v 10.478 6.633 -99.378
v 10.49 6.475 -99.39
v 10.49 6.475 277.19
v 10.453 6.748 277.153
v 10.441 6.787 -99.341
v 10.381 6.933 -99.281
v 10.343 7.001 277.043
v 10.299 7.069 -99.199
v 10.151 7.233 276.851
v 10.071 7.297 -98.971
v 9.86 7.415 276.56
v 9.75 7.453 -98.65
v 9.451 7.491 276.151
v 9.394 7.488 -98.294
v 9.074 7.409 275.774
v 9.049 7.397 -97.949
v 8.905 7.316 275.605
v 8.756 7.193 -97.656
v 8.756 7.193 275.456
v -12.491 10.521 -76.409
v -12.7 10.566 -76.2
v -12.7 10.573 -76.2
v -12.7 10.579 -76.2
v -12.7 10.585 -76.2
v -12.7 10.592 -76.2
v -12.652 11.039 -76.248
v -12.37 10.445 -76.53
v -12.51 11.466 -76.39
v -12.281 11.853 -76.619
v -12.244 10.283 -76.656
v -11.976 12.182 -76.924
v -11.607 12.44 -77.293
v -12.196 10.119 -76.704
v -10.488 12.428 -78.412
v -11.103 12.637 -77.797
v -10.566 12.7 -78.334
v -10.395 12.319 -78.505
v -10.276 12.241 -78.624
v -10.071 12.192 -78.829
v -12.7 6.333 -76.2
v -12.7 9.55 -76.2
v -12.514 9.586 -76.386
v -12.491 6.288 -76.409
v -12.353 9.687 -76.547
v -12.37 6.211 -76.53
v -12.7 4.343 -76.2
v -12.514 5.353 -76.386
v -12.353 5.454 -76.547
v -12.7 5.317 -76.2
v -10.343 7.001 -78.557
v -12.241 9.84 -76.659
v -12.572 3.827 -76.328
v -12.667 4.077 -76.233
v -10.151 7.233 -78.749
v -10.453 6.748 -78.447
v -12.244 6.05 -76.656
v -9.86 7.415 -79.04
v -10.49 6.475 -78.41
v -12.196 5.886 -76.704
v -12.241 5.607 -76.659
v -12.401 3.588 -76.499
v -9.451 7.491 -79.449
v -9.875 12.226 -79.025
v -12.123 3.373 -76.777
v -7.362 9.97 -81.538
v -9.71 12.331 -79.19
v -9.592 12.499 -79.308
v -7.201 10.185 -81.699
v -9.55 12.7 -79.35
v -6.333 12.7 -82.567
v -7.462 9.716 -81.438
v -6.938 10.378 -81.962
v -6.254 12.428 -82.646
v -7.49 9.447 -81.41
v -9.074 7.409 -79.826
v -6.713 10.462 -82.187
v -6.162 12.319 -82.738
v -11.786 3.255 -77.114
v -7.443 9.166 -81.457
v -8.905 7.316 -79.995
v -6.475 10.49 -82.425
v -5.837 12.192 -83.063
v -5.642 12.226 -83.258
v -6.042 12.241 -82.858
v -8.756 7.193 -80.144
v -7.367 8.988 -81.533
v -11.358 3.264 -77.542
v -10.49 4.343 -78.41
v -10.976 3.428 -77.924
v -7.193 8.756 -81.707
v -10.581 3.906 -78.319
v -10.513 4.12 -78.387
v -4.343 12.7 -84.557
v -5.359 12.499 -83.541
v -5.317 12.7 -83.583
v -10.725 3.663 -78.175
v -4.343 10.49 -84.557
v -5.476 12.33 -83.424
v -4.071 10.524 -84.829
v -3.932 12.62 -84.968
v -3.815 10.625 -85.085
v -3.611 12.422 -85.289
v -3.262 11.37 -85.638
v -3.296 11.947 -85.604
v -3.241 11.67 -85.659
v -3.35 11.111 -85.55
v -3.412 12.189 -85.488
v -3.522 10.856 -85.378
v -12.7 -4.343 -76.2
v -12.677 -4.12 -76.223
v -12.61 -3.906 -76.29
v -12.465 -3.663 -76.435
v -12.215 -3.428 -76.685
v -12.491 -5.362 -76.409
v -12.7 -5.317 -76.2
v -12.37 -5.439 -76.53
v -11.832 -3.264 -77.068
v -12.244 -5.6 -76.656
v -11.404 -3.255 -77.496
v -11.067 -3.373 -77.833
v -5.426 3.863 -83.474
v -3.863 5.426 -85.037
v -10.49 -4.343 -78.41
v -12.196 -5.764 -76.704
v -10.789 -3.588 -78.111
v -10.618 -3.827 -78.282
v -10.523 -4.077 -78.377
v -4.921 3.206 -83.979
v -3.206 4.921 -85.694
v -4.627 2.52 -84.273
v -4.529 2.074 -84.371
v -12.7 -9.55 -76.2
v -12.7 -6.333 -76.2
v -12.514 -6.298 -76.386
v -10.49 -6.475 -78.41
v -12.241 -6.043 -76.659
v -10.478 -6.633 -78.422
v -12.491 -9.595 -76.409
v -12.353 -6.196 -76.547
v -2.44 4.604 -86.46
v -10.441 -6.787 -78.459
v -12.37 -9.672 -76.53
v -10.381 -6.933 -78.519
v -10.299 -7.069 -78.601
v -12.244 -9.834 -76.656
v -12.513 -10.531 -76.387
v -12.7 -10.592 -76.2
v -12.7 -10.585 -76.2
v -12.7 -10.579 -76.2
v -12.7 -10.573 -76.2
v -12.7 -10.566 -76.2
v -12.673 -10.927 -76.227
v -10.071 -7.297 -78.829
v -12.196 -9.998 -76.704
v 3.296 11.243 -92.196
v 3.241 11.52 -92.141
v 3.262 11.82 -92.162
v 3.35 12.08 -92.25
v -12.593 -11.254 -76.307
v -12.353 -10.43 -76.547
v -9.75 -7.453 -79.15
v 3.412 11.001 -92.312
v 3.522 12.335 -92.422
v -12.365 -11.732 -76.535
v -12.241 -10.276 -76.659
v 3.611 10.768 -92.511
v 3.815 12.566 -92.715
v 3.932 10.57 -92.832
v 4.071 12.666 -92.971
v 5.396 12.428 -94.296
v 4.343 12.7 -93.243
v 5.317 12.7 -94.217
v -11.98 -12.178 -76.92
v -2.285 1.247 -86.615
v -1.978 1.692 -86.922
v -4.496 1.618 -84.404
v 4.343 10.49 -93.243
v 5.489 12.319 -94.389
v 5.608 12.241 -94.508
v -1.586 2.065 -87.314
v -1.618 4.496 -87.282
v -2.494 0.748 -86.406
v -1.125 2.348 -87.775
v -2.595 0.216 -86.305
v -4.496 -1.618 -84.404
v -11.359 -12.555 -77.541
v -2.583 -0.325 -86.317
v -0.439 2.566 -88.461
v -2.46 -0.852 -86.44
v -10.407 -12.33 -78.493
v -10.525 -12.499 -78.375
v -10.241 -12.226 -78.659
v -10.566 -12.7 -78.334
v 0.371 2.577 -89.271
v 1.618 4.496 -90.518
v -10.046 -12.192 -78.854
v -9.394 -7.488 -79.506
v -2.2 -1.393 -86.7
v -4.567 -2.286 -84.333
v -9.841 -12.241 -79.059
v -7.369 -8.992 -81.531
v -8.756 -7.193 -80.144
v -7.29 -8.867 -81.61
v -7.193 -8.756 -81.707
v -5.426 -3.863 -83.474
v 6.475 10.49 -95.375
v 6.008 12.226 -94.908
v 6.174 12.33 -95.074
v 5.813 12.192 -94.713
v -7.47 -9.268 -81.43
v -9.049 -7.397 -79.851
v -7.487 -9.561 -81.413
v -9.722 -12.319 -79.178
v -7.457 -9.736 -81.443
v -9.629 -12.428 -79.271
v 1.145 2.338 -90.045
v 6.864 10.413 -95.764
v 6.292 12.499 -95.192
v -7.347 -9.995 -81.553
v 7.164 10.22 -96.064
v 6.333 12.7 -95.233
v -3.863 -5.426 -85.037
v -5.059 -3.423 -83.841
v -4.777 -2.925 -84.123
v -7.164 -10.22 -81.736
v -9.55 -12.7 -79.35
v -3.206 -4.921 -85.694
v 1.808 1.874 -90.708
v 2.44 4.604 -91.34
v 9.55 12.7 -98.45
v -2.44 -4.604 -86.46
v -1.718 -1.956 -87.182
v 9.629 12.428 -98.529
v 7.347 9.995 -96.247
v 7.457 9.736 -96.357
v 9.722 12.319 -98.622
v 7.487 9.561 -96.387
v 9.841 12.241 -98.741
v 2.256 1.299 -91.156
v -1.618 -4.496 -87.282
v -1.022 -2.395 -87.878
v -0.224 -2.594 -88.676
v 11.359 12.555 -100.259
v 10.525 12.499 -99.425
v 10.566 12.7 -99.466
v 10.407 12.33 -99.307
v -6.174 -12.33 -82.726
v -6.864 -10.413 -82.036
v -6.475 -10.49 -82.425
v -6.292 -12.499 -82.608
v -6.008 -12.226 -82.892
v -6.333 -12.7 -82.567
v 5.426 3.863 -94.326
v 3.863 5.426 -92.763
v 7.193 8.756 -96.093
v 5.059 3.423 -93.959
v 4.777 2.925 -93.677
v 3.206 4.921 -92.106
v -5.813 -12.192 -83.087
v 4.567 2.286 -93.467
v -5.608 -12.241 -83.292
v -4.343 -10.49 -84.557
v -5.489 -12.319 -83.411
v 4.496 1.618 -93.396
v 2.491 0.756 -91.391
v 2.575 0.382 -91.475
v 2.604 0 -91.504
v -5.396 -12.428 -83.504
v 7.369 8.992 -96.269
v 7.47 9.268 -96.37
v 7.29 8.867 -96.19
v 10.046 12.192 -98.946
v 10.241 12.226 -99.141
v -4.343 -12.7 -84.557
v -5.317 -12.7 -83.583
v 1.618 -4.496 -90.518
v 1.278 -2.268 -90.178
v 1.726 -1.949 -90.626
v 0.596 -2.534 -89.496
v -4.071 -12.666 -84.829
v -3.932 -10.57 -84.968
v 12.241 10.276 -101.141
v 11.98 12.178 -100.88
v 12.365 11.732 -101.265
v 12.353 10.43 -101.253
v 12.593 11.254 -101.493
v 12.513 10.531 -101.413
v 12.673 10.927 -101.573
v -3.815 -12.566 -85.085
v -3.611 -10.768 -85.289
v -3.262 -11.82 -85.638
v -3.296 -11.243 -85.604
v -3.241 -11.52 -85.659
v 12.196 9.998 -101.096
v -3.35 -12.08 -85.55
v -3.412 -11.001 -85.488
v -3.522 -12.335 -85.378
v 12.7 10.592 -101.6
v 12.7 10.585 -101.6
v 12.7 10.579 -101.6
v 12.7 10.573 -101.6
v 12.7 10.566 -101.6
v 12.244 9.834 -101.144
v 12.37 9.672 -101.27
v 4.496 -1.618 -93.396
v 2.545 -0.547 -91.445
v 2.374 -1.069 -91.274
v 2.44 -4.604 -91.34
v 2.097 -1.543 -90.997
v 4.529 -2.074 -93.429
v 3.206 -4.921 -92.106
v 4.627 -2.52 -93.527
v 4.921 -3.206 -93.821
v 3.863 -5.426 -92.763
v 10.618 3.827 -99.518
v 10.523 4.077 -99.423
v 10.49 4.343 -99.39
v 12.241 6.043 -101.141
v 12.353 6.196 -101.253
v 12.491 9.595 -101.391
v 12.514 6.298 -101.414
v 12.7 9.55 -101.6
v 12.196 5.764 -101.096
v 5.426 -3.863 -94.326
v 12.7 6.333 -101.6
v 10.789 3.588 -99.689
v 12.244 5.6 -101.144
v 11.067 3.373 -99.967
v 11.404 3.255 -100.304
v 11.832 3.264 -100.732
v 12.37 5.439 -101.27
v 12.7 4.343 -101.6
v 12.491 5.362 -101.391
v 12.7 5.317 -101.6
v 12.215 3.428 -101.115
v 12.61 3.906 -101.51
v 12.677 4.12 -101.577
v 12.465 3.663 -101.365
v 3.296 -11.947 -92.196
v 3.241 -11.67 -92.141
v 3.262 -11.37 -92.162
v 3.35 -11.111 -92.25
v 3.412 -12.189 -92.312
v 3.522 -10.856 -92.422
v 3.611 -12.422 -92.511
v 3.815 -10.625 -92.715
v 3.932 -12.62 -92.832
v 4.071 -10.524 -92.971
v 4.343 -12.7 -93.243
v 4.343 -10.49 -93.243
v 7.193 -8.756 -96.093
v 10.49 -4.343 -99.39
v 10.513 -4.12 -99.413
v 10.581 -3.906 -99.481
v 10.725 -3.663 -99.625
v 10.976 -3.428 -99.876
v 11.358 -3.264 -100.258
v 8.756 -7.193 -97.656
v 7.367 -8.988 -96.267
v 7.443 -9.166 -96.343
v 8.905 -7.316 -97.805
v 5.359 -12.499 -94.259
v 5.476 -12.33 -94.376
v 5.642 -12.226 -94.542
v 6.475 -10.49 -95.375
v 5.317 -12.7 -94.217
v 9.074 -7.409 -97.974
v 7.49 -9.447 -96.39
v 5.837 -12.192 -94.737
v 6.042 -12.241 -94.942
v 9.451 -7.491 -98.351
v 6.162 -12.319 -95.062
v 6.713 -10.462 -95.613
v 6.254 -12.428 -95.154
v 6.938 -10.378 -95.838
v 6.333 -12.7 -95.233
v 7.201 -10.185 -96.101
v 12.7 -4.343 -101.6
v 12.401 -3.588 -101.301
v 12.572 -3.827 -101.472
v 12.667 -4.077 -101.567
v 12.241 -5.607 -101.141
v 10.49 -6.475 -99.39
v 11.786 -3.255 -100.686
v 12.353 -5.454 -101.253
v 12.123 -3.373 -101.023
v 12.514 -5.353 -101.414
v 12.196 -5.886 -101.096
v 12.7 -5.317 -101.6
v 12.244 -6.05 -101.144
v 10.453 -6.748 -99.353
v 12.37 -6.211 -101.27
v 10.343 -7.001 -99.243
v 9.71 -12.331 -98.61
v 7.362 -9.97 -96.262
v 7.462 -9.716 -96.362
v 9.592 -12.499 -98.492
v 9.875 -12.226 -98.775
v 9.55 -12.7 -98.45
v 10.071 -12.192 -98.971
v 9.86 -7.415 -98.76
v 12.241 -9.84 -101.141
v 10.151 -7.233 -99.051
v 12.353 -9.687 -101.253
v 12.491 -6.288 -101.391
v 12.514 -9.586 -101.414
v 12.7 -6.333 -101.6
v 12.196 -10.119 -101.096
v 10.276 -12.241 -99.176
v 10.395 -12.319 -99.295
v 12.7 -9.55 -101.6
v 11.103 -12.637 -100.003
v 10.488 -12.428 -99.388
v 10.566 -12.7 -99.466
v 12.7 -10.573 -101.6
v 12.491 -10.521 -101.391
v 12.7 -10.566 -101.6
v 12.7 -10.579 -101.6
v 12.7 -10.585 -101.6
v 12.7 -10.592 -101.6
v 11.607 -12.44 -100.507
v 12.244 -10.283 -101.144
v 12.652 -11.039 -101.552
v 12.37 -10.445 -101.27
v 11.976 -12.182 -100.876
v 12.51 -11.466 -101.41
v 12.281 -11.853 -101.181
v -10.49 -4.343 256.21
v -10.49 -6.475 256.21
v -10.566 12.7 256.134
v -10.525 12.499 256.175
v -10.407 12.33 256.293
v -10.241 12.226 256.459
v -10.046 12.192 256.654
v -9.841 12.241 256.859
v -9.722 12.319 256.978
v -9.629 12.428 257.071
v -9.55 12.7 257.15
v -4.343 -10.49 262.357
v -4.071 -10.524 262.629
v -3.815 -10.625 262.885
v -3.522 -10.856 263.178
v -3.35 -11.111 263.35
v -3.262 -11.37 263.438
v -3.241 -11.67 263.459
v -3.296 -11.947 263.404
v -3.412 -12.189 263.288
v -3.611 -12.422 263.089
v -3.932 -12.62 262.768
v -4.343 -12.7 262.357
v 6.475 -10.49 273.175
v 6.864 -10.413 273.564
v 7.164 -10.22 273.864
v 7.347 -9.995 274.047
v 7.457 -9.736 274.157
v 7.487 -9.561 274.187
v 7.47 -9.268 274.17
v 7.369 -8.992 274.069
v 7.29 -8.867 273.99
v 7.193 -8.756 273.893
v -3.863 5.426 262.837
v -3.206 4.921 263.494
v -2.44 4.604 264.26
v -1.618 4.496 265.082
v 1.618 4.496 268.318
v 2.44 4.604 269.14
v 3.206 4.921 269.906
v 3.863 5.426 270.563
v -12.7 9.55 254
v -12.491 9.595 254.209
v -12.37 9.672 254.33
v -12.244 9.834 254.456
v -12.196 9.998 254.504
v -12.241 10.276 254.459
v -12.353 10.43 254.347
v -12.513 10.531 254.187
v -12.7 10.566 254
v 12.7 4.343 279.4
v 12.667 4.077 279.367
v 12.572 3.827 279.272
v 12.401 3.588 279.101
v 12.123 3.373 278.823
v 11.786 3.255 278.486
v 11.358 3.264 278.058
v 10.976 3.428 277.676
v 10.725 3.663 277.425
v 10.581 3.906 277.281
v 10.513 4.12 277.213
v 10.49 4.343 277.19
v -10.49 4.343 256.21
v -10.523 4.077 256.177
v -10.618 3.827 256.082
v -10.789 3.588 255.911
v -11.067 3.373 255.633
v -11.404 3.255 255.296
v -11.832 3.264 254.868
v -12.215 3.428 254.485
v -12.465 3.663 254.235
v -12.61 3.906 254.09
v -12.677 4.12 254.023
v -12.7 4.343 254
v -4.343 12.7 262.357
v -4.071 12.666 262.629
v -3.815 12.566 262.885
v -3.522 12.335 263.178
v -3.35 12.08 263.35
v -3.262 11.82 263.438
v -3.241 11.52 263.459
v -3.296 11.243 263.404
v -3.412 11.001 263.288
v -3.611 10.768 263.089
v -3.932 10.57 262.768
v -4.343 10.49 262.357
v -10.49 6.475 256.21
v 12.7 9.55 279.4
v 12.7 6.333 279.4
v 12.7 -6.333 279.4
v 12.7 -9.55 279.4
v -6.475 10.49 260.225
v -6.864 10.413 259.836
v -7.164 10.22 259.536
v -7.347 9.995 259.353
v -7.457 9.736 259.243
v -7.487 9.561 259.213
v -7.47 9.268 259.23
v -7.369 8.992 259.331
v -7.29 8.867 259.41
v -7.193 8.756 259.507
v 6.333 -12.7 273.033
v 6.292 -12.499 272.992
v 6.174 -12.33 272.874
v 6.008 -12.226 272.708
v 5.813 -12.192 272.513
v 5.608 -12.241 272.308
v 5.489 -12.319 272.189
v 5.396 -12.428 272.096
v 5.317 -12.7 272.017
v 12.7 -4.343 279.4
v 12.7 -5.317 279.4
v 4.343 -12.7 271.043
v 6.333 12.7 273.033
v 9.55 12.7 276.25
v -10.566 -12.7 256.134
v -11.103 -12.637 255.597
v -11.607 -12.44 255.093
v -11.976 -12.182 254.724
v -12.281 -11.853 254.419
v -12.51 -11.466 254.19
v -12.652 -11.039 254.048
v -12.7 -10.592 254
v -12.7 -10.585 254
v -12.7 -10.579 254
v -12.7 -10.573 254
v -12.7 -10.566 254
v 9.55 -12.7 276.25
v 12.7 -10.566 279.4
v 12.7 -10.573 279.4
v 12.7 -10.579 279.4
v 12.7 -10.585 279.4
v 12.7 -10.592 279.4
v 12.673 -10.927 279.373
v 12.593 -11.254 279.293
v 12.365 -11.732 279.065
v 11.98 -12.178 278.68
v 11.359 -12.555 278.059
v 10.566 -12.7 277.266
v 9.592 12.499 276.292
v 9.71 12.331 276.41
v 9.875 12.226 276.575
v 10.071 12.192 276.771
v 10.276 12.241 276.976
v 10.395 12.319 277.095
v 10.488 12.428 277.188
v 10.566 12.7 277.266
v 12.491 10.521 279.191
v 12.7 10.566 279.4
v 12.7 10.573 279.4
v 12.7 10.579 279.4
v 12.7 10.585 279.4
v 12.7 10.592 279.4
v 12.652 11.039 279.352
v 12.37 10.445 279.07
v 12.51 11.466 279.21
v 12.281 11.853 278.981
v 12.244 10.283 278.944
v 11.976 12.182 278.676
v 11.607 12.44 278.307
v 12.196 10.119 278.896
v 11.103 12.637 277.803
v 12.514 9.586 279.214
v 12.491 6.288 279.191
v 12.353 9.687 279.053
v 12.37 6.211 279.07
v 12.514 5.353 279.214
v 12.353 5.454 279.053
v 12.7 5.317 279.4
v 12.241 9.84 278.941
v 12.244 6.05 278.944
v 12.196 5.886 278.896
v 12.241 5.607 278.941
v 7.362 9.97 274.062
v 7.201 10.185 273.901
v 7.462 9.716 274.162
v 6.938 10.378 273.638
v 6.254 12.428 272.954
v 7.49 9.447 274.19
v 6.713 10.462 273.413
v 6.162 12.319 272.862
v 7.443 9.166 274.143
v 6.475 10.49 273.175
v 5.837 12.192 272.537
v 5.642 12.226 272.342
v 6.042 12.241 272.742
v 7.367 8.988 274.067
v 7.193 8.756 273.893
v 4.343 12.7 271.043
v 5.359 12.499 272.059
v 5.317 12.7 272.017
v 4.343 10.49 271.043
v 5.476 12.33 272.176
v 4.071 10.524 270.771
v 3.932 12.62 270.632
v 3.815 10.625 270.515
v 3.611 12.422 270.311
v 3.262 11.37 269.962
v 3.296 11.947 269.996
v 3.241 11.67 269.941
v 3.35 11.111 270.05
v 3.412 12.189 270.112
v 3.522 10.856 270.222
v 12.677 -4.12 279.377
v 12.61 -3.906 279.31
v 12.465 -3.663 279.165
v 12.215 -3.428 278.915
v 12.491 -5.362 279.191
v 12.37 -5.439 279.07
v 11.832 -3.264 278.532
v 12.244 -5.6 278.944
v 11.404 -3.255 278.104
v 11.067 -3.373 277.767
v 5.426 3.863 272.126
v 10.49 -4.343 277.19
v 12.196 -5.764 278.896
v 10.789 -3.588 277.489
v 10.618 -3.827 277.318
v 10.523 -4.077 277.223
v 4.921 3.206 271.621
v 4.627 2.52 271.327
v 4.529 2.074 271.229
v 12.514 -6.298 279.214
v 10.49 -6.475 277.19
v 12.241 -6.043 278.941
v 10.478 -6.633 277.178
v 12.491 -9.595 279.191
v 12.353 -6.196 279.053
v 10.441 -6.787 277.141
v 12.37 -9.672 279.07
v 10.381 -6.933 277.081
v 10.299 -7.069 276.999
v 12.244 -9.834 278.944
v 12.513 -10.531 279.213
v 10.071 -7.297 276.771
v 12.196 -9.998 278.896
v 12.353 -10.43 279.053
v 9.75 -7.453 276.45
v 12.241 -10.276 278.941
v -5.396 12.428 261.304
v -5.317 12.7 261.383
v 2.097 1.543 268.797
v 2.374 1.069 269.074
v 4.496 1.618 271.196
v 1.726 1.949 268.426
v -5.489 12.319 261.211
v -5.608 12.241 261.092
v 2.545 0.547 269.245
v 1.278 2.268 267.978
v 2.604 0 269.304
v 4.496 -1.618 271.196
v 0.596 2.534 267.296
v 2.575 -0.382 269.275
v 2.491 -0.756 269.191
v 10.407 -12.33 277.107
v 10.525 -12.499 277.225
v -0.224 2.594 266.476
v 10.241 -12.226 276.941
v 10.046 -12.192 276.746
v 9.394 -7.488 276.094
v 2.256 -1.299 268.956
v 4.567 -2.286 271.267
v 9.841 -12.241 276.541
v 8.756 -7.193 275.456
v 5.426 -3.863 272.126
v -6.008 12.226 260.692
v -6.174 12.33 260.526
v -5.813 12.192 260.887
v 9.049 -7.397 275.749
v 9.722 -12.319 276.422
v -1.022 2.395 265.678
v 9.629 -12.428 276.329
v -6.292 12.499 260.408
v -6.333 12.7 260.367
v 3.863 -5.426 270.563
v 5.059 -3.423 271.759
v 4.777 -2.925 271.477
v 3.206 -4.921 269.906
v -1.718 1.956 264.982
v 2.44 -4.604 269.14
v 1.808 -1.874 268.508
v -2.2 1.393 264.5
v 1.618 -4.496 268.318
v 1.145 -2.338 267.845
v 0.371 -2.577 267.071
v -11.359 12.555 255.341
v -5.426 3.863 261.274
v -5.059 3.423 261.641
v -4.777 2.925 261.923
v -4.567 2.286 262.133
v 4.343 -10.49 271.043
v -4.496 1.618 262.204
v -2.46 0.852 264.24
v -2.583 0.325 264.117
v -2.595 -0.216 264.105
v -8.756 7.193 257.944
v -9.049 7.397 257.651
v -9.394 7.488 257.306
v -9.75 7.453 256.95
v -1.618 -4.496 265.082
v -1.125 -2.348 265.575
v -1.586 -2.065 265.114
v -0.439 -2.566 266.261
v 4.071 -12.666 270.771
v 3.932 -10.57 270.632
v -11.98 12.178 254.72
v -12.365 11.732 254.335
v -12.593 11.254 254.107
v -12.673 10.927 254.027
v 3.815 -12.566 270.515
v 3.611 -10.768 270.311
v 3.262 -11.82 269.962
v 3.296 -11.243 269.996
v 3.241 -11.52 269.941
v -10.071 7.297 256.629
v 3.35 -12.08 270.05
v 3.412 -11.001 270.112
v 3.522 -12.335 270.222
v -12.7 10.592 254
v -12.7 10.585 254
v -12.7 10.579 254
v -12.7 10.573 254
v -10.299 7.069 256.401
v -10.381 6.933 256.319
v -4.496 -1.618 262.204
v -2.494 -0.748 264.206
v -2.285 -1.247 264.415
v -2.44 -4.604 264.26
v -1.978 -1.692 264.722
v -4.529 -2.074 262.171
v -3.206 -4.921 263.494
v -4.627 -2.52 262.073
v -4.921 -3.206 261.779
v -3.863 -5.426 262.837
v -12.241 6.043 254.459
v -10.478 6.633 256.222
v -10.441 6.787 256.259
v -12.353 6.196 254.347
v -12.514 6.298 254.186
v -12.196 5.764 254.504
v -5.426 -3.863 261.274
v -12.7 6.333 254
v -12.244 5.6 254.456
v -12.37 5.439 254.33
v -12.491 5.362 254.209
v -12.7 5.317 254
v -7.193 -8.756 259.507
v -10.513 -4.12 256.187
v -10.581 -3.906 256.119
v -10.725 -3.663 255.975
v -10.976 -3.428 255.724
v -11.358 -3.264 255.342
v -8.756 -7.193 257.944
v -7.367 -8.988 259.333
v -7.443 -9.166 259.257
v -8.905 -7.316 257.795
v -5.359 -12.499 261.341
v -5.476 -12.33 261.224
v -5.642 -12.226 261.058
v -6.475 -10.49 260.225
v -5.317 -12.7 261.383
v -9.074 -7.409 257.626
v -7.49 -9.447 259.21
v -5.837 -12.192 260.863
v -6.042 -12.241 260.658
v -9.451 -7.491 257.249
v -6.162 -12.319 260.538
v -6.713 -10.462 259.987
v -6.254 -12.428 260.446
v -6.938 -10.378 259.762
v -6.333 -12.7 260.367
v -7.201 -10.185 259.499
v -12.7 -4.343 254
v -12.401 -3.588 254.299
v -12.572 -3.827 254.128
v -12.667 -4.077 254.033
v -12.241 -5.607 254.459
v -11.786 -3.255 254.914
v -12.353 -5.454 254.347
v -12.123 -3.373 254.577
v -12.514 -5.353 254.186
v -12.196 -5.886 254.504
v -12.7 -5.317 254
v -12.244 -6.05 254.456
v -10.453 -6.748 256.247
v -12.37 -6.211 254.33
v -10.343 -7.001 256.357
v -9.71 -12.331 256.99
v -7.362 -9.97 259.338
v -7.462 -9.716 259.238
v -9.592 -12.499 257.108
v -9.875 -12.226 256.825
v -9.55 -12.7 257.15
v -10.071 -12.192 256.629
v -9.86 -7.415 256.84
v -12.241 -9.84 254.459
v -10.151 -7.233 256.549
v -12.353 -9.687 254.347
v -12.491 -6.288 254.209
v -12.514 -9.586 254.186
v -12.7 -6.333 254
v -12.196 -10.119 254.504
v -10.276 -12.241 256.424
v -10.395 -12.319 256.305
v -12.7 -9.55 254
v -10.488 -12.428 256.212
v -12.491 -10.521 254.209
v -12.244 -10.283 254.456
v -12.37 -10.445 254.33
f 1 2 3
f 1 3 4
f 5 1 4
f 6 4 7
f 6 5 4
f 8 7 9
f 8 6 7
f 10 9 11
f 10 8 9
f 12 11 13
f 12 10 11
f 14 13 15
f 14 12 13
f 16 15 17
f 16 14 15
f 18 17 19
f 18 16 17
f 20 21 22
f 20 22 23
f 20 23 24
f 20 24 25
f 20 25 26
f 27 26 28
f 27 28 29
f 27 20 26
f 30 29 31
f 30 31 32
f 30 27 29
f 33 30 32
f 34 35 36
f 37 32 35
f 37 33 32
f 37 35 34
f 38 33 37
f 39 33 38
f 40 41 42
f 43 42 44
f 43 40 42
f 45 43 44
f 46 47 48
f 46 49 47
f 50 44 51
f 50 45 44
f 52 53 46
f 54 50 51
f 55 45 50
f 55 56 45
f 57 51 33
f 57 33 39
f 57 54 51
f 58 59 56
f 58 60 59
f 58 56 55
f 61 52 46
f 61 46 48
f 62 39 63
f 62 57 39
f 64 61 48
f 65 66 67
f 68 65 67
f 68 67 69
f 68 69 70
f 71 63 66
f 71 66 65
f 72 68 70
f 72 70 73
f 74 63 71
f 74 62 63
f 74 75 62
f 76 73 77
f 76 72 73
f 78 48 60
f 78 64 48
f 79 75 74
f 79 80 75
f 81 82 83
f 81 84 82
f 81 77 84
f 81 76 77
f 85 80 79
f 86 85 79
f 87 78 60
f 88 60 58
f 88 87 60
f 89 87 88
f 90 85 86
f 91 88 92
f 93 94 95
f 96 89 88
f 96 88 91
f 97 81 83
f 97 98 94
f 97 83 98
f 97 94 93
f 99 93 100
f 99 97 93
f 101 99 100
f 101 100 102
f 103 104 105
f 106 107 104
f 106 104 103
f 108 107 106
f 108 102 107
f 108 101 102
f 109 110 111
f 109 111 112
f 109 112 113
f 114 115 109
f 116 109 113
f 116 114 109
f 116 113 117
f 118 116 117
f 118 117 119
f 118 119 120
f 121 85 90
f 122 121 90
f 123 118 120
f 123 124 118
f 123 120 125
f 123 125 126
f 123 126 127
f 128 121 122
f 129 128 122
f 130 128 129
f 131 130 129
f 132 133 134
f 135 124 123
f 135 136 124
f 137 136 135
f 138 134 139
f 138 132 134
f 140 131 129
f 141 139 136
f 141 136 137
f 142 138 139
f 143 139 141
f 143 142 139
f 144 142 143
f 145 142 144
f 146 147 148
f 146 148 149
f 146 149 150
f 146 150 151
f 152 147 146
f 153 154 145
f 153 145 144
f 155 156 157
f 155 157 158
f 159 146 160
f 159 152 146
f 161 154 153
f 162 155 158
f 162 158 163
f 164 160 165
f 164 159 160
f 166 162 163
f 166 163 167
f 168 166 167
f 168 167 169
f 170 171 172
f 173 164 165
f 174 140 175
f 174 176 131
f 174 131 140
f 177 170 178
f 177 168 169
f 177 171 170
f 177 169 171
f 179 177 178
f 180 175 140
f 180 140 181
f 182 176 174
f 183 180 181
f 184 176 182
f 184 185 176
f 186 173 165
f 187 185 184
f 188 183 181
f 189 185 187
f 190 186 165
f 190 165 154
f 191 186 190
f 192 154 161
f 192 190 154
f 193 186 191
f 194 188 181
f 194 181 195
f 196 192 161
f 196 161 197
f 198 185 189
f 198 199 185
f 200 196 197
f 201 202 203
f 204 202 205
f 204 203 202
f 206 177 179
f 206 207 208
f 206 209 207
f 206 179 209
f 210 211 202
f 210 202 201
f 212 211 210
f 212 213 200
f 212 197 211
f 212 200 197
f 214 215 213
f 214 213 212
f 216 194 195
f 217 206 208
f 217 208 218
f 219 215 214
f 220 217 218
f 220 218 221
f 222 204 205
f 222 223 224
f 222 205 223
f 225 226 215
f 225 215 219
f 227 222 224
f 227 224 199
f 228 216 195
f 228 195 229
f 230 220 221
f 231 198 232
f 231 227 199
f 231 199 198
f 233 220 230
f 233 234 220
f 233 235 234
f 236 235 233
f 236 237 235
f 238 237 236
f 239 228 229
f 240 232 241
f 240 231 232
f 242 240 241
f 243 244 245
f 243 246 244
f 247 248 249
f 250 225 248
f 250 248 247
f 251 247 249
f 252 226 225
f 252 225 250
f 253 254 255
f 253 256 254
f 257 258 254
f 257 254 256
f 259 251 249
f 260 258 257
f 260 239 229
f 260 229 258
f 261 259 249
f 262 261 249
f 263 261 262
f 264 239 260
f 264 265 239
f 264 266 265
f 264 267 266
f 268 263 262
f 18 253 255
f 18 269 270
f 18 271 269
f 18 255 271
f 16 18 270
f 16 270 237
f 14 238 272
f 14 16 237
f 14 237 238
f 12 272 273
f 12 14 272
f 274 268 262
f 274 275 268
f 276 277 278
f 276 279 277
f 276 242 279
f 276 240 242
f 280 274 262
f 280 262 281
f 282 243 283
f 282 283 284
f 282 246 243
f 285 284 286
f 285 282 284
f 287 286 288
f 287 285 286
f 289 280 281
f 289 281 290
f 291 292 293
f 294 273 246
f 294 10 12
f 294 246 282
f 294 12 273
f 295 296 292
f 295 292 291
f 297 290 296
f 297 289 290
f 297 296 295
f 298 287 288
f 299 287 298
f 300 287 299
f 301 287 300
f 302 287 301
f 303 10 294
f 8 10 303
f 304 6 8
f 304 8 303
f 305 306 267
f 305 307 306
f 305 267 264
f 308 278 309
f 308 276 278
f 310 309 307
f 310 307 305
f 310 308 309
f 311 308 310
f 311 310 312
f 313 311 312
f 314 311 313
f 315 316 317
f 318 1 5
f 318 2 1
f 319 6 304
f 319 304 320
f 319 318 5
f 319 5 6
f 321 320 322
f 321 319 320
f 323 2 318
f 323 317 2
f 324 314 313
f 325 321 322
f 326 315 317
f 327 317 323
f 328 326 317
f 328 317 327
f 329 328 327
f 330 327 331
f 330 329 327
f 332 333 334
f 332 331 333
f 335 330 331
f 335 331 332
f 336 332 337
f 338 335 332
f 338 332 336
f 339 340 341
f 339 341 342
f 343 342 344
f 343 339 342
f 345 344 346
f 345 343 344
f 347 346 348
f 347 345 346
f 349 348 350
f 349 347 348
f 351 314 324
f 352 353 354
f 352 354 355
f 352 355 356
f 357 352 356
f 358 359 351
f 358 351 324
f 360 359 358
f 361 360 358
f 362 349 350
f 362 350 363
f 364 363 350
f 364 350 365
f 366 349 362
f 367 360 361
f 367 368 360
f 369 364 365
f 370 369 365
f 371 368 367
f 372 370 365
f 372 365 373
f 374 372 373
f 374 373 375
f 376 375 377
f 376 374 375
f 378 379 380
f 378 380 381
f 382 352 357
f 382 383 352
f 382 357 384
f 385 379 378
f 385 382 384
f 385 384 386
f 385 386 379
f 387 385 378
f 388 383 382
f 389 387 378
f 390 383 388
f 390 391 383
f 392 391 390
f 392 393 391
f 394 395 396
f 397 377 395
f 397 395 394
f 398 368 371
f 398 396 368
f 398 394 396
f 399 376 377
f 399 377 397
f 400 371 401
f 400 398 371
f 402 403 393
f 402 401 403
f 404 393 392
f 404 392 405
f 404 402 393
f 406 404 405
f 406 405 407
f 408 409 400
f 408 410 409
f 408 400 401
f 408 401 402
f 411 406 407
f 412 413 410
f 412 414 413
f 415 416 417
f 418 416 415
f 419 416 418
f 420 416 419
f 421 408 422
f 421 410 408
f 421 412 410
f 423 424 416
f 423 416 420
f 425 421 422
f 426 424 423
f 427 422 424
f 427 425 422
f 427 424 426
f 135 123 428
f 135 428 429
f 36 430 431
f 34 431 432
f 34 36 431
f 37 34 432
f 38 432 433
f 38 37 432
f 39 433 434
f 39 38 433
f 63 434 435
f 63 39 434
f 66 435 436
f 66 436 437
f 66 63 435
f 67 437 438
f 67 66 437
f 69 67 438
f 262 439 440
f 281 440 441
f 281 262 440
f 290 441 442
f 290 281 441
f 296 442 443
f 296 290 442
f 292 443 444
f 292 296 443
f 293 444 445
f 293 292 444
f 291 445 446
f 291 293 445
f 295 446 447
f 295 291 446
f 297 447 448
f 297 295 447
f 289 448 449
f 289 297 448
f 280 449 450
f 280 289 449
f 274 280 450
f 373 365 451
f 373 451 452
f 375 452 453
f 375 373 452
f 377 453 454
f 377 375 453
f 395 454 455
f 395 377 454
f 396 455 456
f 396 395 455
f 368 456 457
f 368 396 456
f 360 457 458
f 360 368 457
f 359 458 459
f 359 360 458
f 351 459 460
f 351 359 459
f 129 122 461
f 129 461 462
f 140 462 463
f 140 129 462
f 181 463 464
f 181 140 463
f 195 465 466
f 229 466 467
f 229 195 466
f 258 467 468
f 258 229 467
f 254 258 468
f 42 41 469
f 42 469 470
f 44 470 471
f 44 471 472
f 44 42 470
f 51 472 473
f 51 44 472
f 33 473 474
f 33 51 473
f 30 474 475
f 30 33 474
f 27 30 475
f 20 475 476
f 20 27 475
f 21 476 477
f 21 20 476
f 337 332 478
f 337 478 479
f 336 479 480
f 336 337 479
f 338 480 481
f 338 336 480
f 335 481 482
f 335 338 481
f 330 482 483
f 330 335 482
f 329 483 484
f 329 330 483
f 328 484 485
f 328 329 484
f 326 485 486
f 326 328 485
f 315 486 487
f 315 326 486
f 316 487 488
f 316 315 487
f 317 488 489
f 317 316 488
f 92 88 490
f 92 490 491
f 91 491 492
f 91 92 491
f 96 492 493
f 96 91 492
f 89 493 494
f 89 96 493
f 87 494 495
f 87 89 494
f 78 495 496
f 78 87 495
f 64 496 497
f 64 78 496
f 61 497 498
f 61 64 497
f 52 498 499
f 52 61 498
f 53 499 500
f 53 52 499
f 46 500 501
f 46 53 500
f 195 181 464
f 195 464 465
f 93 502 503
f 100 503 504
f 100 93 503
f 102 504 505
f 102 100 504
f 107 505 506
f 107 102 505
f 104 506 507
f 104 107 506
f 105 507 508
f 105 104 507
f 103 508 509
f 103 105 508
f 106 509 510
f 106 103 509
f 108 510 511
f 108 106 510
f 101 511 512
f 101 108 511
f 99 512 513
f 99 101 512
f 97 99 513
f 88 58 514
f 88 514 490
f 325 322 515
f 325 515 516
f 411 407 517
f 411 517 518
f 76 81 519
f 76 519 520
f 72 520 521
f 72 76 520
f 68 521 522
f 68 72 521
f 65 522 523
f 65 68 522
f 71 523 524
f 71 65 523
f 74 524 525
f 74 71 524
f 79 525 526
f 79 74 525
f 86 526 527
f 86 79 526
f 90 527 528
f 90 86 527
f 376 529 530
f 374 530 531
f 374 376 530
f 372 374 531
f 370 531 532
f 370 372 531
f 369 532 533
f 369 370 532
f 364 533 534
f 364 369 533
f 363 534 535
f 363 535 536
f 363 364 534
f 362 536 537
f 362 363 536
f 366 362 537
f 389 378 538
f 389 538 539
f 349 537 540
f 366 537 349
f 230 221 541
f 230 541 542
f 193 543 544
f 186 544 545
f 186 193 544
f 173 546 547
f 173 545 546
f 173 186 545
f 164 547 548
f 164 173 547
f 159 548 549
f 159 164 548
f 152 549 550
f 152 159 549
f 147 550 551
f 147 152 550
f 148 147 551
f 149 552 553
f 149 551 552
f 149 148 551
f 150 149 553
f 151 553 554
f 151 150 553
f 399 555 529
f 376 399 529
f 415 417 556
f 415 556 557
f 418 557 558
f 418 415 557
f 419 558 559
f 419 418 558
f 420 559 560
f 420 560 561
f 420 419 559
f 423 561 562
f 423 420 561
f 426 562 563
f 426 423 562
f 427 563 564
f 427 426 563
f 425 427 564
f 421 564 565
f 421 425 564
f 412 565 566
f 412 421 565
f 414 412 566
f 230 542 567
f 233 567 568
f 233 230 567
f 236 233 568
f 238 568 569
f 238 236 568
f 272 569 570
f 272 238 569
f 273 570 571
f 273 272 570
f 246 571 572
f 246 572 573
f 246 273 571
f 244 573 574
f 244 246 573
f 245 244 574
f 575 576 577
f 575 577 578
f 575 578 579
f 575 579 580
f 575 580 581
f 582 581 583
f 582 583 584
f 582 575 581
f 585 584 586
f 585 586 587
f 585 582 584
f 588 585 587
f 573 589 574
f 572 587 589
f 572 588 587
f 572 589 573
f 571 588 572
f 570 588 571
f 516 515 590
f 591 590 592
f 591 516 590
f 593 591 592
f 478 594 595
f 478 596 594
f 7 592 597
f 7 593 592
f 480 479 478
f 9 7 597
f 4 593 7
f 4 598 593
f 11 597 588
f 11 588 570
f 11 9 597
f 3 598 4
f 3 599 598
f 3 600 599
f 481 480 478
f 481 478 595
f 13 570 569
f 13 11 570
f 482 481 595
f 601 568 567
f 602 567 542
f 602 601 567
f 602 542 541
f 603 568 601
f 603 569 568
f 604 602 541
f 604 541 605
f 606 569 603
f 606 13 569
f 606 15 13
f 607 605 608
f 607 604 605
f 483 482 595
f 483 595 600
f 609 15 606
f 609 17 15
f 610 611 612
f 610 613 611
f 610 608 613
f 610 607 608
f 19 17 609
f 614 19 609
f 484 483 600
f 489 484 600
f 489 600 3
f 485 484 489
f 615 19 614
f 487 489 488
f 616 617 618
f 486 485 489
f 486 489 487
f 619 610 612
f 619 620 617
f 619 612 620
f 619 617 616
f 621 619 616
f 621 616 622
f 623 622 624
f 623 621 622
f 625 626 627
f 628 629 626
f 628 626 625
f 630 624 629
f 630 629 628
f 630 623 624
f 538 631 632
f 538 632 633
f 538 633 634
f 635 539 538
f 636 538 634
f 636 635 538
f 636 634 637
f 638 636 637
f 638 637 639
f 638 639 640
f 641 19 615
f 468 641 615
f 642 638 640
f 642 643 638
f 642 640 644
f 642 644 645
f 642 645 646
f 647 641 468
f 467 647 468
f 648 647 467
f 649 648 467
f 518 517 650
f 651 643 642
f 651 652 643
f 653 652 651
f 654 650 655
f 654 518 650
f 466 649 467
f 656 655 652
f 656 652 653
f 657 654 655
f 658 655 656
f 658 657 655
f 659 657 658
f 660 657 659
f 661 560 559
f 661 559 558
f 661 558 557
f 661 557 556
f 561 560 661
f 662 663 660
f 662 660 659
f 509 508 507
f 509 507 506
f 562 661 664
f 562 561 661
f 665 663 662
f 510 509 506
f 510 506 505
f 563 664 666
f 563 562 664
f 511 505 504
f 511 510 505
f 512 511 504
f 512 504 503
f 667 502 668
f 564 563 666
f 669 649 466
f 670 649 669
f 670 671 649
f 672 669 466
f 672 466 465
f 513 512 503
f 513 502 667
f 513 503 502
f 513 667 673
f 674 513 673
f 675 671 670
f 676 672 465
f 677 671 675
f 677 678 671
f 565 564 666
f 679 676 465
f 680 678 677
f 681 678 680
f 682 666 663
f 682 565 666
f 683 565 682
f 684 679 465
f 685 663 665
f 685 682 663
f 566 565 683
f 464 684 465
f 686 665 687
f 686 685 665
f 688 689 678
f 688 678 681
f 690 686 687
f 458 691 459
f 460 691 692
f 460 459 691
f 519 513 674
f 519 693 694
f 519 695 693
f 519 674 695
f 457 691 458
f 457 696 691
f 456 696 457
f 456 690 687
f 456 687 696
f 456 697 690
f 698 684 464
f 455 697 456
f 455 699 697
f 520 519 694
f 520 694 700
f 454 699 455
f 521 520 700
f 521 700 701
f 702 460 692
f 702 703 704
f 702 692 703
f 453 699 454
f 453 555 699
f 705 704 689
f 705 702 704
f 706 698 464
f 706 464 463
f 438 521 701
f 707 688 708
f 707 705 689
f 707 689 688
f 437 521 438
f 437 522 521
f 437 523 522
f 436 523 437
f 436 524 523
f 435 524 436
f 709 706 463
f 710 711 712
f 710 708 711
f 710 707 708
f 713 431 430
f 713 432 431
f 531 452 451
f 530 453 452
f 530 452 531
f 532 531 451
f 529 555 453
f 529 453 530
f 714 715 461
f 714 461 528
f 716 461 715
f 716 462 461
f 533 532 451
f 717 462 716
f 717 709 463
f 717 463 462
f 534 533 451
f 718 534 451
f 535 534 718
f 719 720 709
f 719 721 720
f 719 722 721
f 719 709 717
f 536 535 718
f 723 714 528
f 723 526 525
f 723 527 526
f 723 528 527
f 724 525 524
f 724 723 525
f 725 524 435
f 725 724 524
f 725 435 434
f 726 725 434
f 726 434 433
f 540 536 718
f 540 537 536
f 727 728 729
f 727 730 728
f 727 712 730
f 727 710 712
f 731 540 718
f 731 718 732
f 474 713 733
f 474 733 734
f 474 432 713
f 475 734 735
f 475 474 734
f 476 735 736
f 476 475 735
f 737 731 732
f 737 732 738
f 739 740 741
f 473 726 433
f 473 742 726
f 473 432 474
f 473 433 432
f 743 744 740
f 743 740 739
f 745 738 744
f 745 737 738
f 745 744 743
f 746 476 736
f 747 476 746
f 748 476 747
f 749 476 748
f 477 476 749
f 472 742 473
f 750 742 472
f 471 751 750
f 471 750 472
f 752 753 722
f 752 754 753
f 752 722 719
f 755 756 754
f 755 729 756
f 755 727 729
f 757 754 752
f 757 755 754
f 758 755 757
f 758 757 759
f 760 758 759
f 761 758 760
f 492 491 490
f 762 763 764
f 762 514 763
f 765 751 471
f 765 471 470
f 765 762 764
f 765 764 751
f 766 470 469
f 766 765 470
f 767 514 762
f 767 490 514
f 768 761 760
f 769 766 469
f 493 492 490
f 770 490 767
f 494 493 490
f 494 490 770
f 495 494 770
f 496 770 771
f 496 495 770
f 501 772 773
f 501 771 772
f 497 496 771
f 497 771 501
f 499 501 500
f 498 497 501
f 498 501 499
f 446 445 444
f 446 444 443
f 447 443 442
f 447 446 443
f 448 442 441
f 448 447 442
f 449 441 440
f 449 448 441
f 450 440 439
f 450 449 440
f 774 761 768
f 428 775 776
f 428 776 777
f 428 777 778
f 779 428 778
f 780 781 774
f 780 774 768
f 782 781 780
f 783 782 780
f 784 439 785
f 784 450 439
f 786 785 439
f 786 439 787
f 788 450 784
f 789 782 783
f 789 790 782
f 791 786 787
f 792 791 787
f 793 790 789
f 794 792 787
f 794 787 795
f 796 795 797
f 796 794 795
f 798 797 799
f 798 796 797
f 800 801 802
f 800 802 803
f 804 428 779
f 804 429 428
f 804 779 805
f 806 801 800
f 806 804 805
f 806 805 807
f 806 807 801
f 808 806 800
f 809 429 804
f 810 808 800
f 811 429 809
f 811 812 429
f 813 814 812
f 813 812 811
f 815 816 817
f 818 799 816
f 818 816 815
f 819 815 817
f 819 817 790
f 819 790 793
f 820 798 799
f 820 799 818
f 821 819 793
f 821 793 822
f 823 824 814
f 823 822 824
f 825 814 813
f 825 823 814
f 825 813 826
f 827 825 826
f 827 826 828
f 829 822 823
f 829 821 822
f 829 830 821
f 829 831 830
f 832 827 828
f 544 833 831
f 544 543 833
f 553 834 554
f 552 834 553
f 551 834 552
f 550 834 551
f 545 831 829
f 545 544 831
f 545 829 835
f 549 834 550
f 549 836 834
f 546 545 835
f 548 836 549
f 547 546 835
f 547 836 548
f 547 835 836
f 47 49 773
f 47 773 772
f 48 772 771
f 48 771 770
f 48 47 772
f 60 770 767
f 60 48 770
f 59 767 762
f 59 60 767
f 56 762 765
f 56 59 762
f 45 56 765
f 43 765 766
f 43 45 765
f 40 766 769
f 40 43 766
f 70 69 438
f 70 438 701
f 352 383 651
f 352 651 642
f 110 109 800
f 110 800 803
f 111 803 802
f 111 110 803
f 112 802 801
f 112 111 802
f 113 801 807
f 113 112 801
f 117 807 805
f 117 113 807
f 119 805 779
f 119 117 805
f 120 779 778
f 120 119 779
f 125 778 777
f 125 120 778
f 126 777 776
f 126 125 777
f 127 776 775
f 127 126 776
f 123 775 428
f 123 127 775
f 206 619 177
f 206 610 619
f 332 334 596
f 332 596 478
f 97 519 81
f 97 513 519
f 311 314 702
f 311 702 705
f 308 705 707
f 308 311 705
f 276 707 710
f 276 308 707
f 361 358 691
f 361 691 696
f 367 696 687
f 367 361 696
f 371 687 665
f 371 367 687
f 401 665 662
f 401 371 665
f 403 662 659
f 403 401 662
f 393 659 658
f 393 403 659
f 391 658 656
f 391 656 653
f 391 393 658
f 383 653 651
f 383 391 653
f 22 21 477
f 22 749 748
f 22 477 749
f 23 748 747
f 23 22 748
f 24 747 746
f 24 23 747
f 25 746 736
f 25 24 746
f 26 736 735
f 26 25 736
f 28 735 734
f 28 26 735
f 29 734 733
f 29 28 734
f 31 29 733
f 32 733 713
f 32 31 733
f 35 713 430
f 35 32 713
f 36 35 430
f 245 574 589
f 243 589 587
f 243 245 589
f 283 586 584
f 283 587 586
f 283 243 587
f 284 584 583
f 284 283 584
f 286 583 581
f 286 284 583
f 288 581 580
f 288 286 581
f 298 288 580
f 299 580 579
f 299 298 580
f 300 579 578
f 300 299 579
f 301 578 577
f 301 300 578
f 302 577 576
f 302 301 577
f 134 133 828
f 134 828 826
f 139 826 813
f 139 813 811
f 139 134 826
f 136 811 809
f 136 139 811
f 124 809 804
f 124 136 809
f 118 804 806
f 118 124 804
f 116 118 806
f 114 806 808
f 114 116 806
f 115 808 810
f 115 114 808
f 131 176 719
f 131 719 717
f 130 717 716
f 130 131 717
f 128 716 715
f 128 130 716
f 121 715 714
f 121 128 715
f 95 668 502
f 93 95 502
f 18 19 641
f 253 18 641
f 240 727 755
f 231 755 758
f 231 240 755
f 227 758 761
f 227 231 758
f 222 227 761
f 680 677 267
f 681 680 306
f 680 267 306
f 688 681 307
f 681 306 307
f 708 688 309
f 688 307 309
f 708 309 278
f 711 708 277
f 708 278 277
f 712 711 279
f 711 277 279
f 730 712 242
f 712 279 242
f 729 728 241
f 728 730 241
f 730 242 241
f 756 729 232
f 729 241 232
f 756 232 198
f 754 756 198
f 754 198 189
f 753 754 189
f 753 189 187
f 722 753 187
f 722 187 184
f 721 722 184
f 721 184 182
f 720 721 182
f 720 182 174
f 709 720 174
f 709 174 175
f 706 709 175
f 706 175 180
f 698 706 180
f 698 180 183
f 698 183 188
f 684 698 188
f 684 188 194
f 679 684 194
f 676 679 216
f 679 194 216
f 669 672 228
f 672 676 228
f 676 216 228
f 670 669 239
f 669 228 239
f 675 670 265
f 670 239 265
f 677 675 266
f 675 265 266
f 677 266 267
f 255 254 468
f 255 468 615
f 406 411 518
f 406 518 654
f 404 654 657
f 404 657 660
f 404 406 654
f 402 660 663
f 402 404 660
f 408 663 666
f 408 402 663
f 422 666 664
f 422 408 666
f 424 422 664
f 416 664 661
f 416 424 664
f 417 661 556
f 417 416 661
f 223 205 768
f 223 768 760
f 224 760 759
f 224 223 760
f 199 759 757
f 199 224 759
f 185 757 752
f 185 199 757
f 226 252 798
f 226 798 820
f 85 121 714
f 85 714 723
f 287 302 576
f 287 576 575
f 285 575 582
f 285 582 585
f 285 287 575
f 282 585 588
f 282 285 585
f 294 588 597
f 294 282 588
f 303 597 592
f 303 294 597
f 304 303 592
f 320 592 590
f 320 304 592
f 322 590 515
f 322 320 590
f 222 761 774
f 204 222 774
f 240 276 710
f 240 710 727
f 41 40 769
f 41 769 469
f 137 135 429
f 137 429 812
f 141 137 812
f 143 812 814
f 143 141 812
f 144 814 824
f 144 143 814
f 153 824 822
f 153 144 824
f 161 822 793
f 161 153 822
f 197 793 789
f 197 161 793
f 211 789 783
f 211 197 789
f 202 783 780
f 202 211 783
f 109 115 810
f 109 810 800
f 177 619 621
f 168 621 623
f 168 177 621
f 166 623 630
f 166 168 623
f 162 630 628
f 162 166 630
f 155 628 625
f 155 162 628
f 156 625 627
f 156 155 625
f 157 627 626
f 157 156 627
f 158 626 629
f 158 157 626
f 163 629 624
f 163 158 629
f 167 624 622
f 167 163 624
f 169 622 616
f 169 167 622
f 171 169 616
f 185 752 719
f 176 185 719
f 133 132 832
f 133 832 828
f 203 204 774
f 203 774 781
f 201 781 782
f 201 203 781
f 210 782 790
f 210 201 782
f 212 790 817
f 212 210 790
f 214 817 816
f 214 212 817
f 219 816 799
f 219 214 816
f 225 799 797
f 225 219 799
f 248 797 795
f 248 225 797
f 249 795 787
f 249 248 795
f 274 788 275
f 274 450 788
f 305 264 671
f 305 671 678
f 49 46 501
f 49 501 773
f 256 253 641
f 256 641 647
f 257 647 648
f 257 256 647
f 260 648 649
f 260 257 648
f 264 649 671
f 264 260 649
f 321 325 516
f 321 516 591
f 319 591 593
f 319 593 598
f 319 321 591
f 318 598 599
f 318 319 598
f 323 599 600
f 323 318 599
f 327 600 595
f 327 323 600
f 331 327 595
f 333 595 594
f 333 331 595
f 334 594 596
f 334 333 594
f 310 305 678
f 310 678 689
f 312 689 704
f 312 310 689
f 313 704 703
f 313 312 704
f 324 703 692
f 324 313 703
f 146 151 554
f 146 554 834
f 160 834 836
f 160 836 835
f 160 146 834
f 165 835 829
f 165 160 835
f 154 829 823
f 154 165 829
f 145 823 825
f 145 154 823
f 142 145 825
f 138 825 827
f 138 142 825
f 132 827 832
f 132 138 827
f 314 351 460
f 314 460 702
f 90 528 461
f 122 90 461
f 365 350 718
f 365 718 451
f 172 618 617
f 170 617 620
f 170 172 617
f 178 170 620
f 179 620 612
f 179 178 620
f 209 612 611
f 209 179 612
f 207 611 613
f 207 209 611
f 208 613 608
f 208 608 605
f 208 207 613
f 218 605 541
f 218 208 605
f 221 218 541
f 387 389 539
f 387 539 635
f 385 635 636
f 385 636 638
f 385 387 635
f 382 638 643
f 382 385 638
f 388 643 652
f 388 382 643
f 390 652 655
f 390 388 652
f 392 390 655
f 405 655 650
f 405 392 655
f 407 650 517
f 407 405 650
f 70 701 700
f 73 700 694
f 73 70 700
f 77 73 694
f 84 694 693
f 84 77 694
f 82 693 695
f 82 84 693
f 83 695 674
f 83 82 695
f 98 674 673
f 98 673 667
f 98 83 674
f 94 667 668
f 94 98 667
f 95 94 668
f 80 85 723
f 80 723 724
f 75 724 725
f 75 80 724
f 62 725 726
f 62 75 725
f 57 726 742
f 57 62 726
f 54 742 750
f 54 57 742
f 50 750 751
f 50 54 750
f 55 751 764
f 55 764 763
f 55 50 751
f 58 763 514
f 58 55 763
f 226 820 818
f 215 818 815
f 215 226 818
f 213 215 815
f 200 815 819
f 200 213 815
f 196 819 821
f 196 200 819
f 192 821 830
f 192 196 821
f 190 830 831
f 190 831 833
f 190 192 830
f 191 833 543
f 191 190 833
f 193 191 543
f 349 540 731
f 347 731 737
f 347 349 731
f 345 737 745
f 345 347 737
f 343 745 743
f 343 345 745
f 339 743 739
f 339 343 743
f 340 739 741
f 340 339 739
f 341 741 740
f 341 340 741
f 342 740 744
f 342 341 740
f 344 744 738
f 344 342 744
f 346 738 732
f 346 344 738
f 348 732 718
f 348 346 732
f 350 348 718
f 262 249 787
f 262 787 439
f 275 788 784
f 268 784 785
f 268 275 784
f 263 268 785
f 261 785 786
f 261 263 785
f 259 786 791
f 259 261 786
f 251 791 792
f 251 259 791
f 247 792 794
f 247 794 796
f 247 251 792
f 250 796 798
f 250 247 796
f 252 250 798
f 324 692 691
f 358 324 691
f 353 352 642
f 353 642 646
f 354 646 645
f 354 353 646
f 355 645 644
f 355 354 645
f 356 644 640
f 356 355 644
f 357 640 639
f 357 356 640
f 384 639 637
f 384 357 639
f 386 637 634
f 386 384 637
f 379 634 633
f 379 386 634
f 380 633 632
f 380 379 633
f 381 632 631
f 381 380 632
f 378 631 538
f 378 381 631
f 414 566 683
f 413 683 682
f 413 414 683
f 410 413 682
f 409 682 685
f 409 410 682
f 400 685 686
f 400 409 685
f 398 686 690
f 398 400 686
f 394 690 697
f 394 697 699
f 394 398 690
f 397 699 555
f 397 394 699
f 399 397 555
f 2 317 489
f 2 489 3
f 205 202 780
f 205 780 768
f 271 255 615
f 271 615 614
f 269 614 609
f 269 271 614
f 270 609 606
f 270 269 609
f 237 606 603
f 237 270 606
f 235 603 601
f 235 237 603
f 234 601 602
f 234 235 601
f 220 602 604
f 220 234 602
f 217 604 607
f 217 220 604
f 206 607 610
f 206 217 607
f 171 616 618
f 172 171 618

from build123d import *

# Parameters (mm, degrees)
SKETCH1_R               = 2.6035
BOSS_EXTRUDE1_DEPTH     = 381
CUT_EXTRUDE2_DEPTH      = 280.9766776
CUT_EXTRUDE2_DEPTH_BACK = 280.9766776
CUT_EXTRUDE3_DEPTH      = 280.9766776
CUT_EXTRUDE3_DEPTH_BACK = 280.9766776


with BuildPart() as part:
    # Sketch1 → Boss-Extrude1 (new body)
    with BuildSketch(Plane(origin=(0, 0, -101.6), x_dir=(-1, 0, 0), z_dir=(0, 0, -1))):
        with BuildLine():
            Line((12.7, -9.5504), (12.7, -6.3330836))
            ThreePointArc((12.7, -6.3330836), (12.192, -5.8250836), (12.7, -5.3170836))
            Line((12.7, -5.3170836), (12.7, -4.3434))
            ThreePointArc((12.7, -4.3434), (11.5951, -3.2385), (10.4902, -4.3434))
            Line((10.4902, -4.3434), (10.4902, -6.474794456))
            ThreePointArc((10.4902, -6.474794456), (9.863006367, -7.413456061), (8.75577951, -7.193214945))
            Line((8.75577951, -7.193214945), (5.42573597, -3.863171405))
            ThreePointArc((5.42573597, -3.863171405), (4.737482484, -2.833127272), (4.4958, -1.618107374))
            Line((4.4958, -1.618107374), (4.4958, 1.618107374))
            ThreePointArc((4.4958, 1.618107374), (4.737482484, 2.833127272), (5.42573597, 3.863171405))
            Line((5.42573597, 3.863171405), (8.75577951, 7.193214945))
            ThreePointArc((8.75577951, 7.193214945), (9.863006367, 7.413456061), (10.4902, 6.474794456))
            Line((10.4902, 6.474794456), (10.4902, 4.343399971))
            ThreePointArc((10.4902, 4.343399971), (11.5951, 3.238499971), (12.7, 4.343399971))
            Line((12.7, 4.343399971), (12.7, 5.3170836))
            ThreePointArc((12.7, 5.3170836), (12.192, 5.8250836), (12.7, 6.3330836))
            Line((12.7, 6.3330836), (12.7, 9.5504))
            ThreePointArc((12.7, 9.5504), (12.192000006, 10.058323491), (12.699846982, 10.566399977))
            ThreePointArc((12.699846982, 10.566399977), (12.082522516, 12.082522516), (10.566399977, 12.699846982))
            ThreePointArc((10.566399977, 12.699846982), (10.058323491, 12.192000006), (9.5504, 12.7))
            Line((9.5504, 12.7), (6.3330836, 12.7))
            ThreePointArc((6.3330836, 12.7), (5.8250836, 12.192), (5.3170836, 12.7))
            Line((5.3170836, 12.7), (4.3434, 12.7))
            ThreePointArc((4.3434, 12.7), (3.2385, 11.5951), (4.3434, 10.4902))
            Line((4.3434, 10.4902), (6.474794456, 10.4902))
            ThreePointArc((6.474794456, 10.4902), (7.413456061, 9.863006367), (7.193214945, 8.75577951))
            Line((7.193214945, 8.75577951), (3.863171405, 5.42573597))
            ThreePointArc((3.863171405, 5.42573597), (2.833127272, 4.737482484), (1.618107374, 4.4958))
            Line((1.618107374, 4.4958), (-1.618107374, 4.4958))
            ThreePointArc((-1.618107374, 4.4958), (-2.833127272, 4.737482484), (-3.863171405, 5.42573597))
            Line((-3.863171405, 5.42573597), (-7.193214945, 8.75577951))
            ThreePointArc((-7.193214945, 8.75577951), (-7.413456061, 9.863006367), (-6.474794456, 10.4902))
            Line((-6.474794456, 10.4902), (-4.343399971, 10.4902))
            ThreePointArc((-4.343399971, 10.4902), (-3.238499971, 11.5951), (-4.343399971, 12.7))
            Line((-4.343399971, 12.7), (-5.3170836, 12.7))
            ThreePointArc((-5.3170836, 12.7), (-5.8250836, 12.192), (-6.3330836, 12.7))
            Line((-6.3330836, 12.7), (-9.5504, 12.7))
            ThreePointArc((-9.5504, 12.7), (-10.058323491, 12.192000006), (-10.566399977, 12.699846982))
            ThreePointArc((-10.566399977, 12.699846982), (-12.082522516, 12.082522516), (-12.699846982, 10.566399977))
            ThreePointArc((-12.699846982, 10.566399977), (-12.192000006, 10.058323491), (-12.7, 9.5504))
            Line((-12.7, 9.5504), (-12.7, 6.3330836))
            ThreePointArc((-12.7, 6.3330836), (-12.192, 5.8250836), (-12.7, 5.3170836))
            Line((-12.7, 5.3170836), (-12.7, 4.3434))
            ThreePointArc((-12.7, 4.3434), (-11.5951, 3.2385), (-10.4902, 4.3434))
            Line((-10.4902, 4.3434), (-10.4902, 6.474794456))
            ThreePointArc((-10.4902, 6.474794456), (-9.863006367, 7.413456061), (-8.75577951, 7.193214945))
            Line((-8.75577951, 7.193214945), (-5.42573597, 3.863171405))
            ThreePointArc((-5.42573597, 3.863171405), (-4.737482484, 2.833127272), (-4.4958, 1.618107374))
            Line((-4.4958, 1.618107374), (-4.4958, -1.618107374))
            ThreePointArc((-4.4958, -1.618107374), (-4.737482484, -2.833127272), (-5.42573597, -3.863171405))
            Line((-5.42573597, -3.863171405), (-8.75577951, -7.193214945))
            ThreePointArc((-8.75577951, -7.193214945), (-9.863006367, -7.413456061), (-10.4902, -6.474794456))
            Line((-10.4902, -6.474794456), (-10.4902, -4.343399971))
            ThreePointArc((-10.4902, -4.343399971), (-11.5951, -3.238499971), (-12.7, -4.343399971))
            Line((-12.7, -4.343399971), (-12.7, -5.3170836))
            ThreePointArc((-12.7, -5.3170836), (-12.192, -5.8250836), (-12.7, -6.3330836))
            Line((-12.7, -6.3330836), (-12.7, -9.5504))
            ThreePointArc((-12.7, -9.5504), (-12.192000006, -10.058323491), (-12.699846982, -10.566399977))
            ThreePointArc((-12.699846982, -10.566399977), (-12.082522516, -12.082522516), (-10.566399977, -12.699846982))
            ThreePointArc((-10.566399977, -12.699846982), (-10.058323491, -12.192000006), (-9.5504, -12.7))
            Line((-9.5504, -12.7), (-6.3330836, -12.7))
            ThreePointArc((-6.3330836, -12.7), (-5.8250836, -12.192), (-5.3170836, -12.7))
            Line((-5.3170836, -12.7), (-4.3434, -12.7))
            ThreePointArc((-4.3434, -12.7), (-3.2385, -11.5951), (-4.3434, -10.4902))
            Line((-4.3434, -10.4902), (-6.474794456, -10.4902))
            ThreePointArc((-6.474794456, -10.4902), (-7.413456061, -9.863006367), (-7.193214945, -8.75577951))
            Line((-7.193214945, -8.75577951), (-3.863171405, -5.42573597))
            ThreePointArc((-3.863171405, -5.42573597), (-2.833127272, -4.737482484), (-1.618107374, -4.4958))
            Line((-1.618107374, -4.4958), (1.618107374, -4.4958))
            ThreePointArc((1.618107374, -4.4958), (2.833127272, -4.737482484), (3.863171405, -5.42573597))
            Line((3.863171405, -5.42573597), (7.193214945, -8.75577951))
            ThreePointArc((7.193214945, -8.75577951), (7.413456061, -9.863006367), (6.474794456, -10.4902))
            Line((6.474794456, -10.4902), (4.343399971, -10.4902))
            ThreePointArc((4.343399971, -10.4902), (3.238499971, -11.5951), (4.343399971, -12.7))
            Line((4.343399971, -12.7), (5.3170836, -12.7))
            ThreePointArc((5.3170836, -12.7), (5.8250836, -12.192), (6.3330836, -12.7))
            Line((6.3330836, -12.7), (9.5504, -12.7))
            ThreePointArc((9.5504, -12.7), (10.058323491, -12.192000006), (10.566399977, -12.699846982))
            ThreePointArc((10.566399977, -12.699846982), (12.082522516, -12.082522516), (12.699846982, -10.566399977))
            ThreePointArc((12.699846982, -10.566399977), (12.192000006, -10.058323491), (12.7, -9.5504))
        make_face()
        with Locations(Location((0, 0, 0), (0, 0, 180))):
            Circle(SKETCH1_R, mode=Mode.SUBTRACT)
    extrude(amount=-BOSS_EXTRUDE1_DEPTH)

    # Sketch2 → Cut-Extrude2 (cut, two sides: drawn at the far end of the back side and taken through both)
    with BuildSketch(Plane(origin=(0, 0, 0), x_dir=(1, 0, 0), z_dir=(0, 1, 0)).offset(-CUT_EXTRUDE2_DEPTH_BACK)):
        Polygon((12.7, 101.6), (-12.7, 101.6), (-12.7, 76.2), align=None)
    extrude(amount=CUT_EXTRUDE2_DEPTH + CUT_EXTRUDE2_DEPTH_BACK, mode=Mode.SUBTRACT)

    # Sketch4 → Cut-Extrude3 (cut, two sides: drawn at the far end of the back side and taken through both)
    with BuildSketch(Plane(origin=(0, 0, 0), x_dir=(1, 0, 0), z_dir=(0, 1, 0)).offset(-CUT_EXTRUDE3_DEPTH_BACK)):
        Polygon((-12.7, -279.4), (12.7, -279.4), (-12.7, -254), align=None)
    extrude(amount=CUT_EXTRUDE3_DEPTH + CUT_EXTRUDE3_DEPTH_BACK, mode=Mode.SUBTRACT)


solid = part.part
